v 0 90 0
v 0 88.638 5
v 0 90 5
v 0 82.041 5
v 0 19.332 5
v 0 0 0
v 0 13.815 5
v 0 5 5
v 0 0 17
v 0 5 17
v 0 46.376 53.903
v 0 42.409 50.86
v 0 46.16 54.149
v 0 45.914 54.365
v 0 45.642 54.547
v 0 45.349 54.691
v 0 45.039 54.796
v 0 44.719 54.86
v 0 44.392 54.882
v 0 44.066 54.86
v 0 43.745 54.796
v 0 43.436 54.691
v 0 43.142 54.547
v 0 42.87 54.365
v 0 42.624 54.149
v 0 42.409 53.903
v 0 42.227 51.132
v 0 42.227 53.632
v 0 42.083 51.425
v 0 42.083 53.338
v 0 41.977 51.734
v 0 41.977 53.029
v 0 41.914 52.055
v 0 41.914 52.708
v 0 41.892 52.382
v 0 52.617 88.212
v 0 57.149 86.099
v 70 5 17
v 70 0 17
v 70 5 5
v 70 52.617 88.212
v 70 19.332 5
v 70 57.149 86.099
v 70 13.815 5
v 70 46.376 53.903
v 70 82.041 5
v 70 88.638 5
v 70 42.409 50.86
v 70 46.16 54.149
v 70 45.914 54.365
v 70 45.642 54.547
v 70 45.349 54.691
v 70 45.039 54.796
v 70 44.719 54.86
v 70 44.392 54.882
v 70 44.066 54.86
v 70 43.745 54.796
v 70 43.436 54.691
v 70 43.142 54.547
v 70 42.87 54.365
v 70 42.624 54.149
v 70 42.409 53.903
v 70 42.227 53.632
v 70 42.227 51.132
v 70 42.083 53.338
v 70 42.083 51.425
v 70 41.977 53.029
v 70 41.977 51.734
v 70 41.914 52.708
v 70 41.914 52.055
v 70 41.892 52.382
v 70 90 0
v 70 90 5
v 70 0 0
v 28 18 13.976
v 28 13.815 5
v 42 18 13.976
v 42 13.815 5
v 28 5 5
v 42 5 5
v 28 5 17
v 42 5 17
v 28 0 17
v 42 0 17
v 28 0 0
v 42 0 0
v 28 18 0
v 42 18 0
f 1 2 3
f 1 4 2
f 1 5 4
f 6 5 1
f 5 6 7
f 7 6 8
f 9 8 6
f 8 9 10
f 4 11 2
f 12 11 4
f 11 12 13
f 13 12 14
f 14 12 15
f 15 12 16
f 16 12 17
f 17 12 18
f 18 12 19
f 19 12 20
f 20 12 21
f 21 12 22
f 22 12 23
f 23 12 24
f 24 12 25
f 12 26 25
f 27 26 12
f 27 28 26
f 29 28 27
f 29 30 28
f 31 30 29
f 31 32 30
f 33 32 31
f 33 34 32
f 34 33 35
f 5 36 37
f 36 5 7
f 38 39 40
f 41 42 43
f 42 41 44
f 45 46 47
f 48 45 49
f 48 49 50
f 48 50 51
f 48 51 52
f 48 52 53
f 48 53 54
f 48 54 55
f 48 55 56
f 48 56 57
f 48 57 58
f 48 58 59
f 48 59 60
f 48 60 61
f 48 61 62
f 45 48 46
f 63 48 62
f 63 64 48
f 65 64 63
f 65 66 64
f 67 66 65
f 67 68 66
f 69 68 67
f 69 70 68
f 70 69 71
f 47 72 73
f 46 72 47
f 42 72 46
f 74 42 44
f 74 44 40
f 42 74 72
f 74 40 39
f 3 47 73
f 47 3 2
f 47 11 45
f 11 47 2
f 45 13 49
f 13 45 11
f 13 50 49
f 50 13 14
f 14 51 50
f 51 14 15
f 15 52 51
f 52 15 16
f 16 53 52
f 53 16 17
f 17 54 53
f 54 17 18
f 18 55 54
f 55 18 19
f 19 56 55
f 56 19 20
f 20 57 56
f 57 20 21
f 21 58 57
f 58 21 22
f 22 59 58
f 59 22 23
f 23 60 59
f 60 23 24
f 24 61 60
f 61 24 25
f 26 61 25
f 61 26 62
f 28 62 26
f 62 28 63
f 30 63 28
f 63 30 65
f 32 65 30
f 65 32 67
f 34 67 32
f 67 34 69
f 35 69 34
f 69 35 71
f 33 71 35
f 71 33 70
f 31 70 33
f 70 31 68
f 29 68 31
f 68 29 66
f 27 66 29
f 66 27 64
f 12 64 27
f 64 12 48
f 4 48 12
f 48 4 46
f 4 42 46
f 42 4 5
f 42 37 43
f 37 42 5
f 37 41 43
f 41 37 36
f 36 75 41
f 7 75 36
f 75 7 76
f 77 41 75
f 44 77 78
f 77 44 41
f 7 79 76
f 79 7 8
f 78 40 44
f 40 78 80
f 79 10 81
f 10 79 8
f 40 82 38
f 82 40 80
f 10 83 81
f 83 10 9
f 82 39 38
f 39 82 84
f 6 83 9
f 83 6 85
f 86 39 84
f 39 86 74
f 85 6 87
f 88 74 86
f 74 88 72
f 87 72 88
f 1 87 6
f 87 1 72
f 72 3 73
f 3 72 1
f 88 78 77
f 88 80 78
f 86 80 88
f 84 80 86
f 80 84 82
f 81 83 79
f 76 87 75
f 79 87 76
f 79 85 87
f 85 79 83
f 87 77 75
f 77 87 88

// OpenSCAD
// Phone stand. Side profile is extruded along X, so it prints flat with no supports.
width = 70;          // stand width
angle = 65;          // back-rest angle from horizontal
phone_t = 12;        // phone + case thickness
lip_h = 12;          // front lip height above base
base_l = 90; t = 5;  // base length, general thickness
back_l = 95;         // back-rest length
cable_slot = 14;     // width of charging-cable slot in the lip/base, 0 = none
$fn = 48;
p0 = [t + phone_t, 0];                                   // back-rest pivot
pb = p0 + back_l * 0.62 * [cos(angle), sin(angle)];       // strut top
module bar(a, b, w) { hull() { translate(a) circle(d = w); translate(b) circle(d = w); } }
module profile() {
  square([base_l, t]);                                    // base
  square([t, lip_h + t]);                                 // front lip
  translate(p0) rotate(angle) square([back_l, t]);        // back-rest
  bar(pb + [t * 0.5, -t * 0.2], [base_l - t / 2, t / 2], t); // strut
}
difference() {
  rotate([90, 0, 90]) linear_extrude(width) profile();
  if (cable_slot > 0) translate([width / 2 - cable_slot / 2, -1, -1]) cube([cable_slot, t + phone_t + 2, lip_h + t + 2]);
}
